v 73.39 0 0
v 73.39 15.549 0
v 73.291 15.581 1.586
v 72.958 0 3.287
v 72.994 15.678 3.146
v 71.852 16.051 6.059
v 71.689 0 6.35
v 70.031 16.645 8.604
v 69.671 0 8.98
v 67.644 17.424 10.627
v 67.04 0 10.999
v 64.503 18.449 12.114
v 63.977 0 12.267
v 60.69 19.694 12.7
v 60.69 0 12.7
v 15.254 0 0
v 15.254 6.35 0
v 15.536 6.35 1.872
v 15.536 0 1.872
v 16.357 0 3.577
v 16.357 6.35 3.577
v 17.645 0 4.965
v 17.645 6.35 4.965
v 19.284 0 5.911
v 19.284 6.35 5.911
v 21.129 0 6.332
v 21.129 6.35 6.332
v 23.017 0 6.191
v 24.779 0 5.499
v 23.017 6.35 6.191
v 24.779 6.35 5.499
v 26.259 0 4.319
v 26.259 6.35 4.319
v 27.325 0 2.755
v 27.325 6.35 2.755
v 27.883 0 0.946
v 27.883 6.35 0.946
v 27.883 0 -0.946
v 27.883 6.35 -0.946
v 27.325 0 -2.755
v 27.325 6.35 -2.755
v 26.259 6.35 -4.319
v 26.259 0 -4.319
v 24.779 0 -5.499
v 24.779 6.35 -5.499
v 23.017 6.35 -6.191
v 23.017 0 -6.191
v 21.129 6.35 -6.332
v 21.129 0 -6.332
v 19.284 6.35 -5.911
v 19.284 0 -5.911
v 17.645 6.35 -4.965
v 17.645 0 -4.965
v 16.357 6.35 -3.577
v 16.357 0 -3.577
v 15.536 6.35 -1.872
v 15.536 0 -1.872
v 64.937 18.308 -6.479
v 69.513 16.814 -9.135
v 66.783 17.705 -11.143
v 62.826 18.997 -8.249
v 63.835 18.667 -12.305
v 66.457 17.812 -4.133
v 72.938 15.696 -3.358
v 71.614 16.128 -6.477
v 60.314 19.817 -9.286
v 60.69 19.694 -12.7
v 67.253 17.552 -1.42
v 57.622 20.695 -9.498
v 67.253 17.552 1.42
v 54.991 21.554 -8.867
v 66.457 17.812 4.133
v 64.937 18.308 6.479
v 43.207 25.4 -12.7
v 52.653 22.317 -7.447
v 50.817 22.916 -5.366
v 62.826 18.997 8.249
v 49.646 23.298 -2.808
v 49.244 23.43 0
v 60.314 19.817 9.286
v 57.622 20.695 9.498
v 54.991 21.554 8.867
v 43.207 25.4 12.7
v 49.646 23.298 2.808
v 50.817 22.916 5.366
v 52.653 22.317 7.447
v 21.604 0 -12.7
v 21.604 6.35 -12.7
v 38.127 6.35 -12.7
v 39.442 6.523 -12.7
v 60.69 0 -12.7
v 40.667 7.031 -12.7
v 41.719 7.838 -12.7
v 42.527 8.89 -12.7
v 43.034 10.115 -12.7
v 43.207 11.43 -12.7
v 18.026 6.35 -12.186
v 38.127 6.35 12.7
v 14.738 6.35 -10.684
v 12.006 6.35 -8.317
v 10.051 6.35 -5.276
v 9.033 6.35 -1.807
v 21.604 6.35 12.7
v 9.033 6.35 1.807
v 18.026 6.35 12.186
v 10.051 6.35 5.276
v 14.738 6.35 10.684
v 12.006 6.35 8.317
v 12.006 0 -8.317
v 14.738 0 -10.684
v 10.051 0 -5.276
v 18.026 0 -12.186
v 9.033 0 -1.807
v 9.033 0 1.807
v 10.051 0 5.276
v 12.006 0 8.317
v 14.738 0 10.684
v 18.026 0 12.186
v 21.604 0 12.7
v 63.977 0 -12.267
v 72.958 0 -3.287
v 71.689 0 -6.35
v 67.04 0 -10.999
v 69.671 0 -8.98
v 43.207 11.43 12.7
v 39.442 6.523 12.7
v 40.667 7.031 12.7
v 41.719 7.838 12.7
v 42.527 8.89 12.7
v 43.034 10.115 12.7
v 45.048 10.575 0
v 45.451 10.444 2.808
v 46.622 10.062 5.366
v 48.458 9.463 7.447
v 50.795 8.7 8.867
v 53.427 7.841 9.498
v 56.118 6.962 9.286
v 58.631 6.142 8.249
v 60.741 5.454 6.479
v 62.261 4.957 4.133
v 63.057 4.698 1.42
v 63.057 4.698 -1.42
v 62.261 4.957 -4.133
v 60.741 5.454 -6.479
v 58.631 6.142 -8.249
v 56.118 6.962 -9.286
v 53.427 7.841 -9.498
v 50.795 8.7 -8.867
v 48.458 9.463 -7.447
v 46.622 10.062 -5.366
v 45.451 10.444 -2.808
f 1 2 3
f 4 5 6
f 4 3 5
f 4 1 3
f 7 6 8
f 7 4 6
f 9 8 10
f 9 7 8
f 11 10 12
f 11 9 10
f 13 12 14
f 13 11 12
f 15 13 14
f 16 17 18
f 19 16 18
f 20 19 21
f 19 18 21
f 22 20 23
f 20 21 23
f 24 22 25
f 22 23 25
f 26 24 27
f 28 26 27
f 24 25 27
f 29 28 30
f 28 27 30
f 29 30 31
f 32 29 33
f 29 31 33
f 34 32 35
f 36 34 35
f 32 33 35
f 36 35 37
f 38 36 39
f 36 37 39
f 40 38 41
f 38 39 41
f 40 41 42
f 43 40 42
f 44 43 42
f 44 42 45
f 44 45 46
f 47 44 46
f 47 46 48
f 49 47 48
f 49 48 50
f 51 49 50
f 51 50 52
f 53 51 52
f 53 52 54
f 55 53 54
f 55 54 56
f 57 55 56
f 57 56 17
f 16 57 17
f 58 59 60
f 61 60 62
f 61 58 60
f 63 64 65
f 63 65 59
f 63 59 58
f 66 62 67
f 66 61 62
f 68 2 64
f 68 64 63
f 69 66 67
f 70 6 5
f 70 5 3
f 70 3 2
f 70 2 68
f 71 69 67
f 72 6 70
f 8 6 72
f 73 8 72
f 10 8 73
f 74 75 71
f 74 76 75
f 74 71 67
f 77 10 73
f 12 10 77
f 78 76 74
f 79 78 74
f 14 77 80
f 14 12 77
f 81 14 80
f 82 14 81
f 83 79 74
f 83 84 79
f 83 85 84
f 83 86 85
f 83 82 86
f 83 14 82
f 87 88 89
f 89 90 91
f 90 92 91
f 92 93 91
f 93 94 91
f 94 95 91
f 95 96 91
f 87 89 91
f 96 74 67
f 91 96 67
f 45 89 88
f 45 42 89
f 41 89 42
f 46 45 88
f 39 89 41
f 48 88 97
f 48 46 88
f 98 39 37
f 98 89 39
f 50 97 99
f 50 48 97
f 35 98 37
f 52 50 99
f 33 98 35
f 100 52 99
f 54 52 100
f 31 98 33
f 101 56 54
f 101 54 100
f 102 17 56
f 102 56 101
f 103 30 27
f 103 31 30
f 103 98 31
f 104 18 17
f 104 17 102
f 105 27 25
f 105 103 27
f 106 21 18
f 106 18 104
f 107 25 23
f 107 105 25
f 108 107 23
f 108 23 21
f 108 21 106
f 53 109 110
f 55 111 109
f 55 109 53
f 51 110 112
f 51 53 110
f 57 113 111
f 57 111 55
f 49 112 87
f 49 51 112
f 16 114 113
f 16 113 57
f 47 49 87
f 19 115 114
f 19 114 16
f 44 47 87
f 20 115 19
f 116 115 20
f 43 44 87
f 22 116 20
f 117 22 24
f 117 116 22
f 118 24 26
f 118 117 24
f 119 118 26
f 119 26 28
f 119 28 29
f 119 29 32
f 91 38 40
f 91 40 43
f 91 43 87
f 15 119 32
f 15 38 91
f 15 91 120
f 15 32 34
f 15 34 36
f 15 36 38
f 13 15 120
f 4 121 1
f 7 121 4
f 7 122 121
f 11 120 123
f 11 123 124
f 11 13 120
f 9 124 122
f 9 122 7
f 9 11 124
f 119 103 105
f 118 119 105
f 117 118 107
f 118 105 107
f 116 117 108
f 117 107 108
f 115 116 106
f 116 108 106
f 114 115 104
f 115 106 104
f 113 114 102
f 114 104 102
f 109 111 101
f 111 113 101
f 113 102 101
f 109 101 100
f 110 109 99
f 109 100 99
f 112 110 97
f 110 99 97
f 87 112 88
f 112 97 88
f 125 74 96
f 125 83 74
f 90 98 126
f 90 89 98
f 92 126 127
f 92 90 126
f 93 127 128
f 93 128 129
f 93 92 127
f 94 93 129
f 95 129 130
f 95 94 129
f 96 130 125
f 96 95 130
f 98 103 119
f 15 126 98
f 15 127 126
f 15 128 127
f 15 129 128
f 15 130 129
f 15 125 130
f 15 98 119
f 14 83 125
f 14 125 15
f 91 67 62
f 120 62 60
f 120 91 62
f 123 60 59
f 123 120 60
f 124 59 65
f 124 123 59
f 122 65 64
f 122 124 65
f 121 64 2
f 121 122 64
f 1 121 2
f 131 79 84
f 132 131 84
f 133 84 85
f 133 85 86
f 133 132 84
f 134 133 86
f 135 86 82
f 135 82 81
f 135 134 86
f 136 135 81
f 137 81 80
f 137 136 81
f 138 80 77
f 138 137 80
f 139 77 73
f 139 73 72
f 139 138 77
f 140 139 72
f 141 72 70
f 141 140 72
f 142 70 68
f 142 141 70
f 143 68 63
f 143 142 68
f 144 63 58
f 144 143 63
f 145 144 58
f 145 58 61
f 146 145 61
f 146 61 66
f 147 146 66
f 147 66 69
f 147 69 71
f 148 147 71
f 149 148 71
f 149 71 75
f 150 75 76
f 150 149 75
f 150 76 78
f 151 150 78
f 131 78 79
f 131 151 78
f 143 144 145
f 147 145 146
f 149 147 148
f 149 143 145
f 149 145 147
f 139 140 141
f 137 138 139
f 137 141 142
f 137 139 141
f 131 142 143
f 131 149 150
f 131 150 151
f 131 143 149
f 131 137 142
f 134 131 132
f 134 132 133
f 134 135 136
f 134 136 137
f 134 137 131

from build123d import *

# Parameters (mm, degrees)
BOSS_EXTRUDE1_DEPTH = 12.7
CUT_EXTRUDE1_START  = -13.521664
SKETCH2_R           = 9.525
CUT_EXTRUDE1_DEPTH  = 13.521664
SKETCH3_R           = 6.35
CUT_EXTRUDE2_DEPTH  = 77.878671194
FILLET3_START       = -1
FILLET3_DEPTH       = 26.4
CUT_EXTRUDE3_DEPTH  = 77.878671193
FILLET4_R           = 5.08


with BuildPart() as part:
    # Sketch1 → Boss-Extrude1 (new, symmetric)
    with BuildSketch(Plane.XY):
        Polygon((0, 0), (73.390309881, 0), (73.390309881, 15.548608999), (43.207324686, 25.4), (43.207324686, 6.35), (0, 6.35), align=None)
    extrude(amount=BOSS_EXTRUDE1_DEPTH, both=True)

    # Sketch2 → Cut-Extrude1 (cut)
    with BuildSketch(Plane(origin=(11.651871006, 35.699349465, 0), x_dir=(0.9506452030208671, -0.3102800315415328, 0), z_dir=(0.3102800315415327, 0.950645203020867, 0)).offset(CUT_EXTRUDE1_START)):
        with Locations(Location((49.068723147, 0, 0), (0, 0, 180))):
            Circle(SKETCH2_R)
    extrude(amount=CUT_EXTRUDE1_DEPTH, mode=Mode.SUBTRACT)

    # Sketch3 → Cut-Extrude2 (cut, through all)
    with BuildSketch(Plane(origin=(0, 6.35, 0), x_dir=(1, 0, 0), z_dir=(0, 1, 0))):
        with Locations(Location((21.603662343, 0, 0), (0, 0, 180))):
            Circle(SKETCH3_R)
    extrude(amount=-CUT_EXTRUDE2_DEPTH, mode=Mode.SUBTRACT)

    # Fillet3: read off the stored shape, not the designer's step
    # Fillet3 outline → Fillet3 (cut)
    with BuildSketch(Plane(origin=(0, 0, 0), x_dir=(1, 0, 0), z_dir=(0, 1, 0)).offset(FILLET3_START)):
        with BuildLine():
            ThreePointArc((60.690309881, 12.7), (69.670566002, 8.980256121), (73.390309881, 0))
            Line((73.390309881, 0), (73.390309881, 12.7))
            Line((73.390309881, 12.7), (60.690309881, 12.7))
        make_face()
        with BuildLine():
            ThreePointArc((73.390309881, 0), (69.670566002, -8.980256121), (60.690309881, -12.7))
            Line((60.690309881, -12.7), (73.390309881, -12.7))
            Line((73.390309881, -12.7), (73.390309881, 0))
        make_face()
    extrude(amount=FILLET3_DEPTH, mode=Mode.SUBTRACT)

    # Sketch4 → Cut-Extrude3 (cut, through all)
    with BuildSketch(Plane(origin=(0, 6.35, 0), x_dir=(1, 0, 0), z_dir=(0, 1, 0))):
        with BuildLine():
            Line((21.603662343, 12.7), (0, 12.7))
            Line((0, 12.7), (0, -12.7))
            Line((0, -12.7), (21.603662343, -12.7))
            ThreePointArc((21.603662343, -12.7), (8.903662343, 0), (21.603662343, 12.7))
        make_face()
    extrude(amount=-CUT_EXTRUDE3_DEPTH, mode=Mode.SUBTRACT)

    # Fillet4
    fillet4_edges = [part.edges().sort_by_distance(p)[0] for p in [
        (43.207324686, 6.35, 0),
    ]]
    fillet(fillet4_edges, radius=FILLET4_R)


solid = part.part
